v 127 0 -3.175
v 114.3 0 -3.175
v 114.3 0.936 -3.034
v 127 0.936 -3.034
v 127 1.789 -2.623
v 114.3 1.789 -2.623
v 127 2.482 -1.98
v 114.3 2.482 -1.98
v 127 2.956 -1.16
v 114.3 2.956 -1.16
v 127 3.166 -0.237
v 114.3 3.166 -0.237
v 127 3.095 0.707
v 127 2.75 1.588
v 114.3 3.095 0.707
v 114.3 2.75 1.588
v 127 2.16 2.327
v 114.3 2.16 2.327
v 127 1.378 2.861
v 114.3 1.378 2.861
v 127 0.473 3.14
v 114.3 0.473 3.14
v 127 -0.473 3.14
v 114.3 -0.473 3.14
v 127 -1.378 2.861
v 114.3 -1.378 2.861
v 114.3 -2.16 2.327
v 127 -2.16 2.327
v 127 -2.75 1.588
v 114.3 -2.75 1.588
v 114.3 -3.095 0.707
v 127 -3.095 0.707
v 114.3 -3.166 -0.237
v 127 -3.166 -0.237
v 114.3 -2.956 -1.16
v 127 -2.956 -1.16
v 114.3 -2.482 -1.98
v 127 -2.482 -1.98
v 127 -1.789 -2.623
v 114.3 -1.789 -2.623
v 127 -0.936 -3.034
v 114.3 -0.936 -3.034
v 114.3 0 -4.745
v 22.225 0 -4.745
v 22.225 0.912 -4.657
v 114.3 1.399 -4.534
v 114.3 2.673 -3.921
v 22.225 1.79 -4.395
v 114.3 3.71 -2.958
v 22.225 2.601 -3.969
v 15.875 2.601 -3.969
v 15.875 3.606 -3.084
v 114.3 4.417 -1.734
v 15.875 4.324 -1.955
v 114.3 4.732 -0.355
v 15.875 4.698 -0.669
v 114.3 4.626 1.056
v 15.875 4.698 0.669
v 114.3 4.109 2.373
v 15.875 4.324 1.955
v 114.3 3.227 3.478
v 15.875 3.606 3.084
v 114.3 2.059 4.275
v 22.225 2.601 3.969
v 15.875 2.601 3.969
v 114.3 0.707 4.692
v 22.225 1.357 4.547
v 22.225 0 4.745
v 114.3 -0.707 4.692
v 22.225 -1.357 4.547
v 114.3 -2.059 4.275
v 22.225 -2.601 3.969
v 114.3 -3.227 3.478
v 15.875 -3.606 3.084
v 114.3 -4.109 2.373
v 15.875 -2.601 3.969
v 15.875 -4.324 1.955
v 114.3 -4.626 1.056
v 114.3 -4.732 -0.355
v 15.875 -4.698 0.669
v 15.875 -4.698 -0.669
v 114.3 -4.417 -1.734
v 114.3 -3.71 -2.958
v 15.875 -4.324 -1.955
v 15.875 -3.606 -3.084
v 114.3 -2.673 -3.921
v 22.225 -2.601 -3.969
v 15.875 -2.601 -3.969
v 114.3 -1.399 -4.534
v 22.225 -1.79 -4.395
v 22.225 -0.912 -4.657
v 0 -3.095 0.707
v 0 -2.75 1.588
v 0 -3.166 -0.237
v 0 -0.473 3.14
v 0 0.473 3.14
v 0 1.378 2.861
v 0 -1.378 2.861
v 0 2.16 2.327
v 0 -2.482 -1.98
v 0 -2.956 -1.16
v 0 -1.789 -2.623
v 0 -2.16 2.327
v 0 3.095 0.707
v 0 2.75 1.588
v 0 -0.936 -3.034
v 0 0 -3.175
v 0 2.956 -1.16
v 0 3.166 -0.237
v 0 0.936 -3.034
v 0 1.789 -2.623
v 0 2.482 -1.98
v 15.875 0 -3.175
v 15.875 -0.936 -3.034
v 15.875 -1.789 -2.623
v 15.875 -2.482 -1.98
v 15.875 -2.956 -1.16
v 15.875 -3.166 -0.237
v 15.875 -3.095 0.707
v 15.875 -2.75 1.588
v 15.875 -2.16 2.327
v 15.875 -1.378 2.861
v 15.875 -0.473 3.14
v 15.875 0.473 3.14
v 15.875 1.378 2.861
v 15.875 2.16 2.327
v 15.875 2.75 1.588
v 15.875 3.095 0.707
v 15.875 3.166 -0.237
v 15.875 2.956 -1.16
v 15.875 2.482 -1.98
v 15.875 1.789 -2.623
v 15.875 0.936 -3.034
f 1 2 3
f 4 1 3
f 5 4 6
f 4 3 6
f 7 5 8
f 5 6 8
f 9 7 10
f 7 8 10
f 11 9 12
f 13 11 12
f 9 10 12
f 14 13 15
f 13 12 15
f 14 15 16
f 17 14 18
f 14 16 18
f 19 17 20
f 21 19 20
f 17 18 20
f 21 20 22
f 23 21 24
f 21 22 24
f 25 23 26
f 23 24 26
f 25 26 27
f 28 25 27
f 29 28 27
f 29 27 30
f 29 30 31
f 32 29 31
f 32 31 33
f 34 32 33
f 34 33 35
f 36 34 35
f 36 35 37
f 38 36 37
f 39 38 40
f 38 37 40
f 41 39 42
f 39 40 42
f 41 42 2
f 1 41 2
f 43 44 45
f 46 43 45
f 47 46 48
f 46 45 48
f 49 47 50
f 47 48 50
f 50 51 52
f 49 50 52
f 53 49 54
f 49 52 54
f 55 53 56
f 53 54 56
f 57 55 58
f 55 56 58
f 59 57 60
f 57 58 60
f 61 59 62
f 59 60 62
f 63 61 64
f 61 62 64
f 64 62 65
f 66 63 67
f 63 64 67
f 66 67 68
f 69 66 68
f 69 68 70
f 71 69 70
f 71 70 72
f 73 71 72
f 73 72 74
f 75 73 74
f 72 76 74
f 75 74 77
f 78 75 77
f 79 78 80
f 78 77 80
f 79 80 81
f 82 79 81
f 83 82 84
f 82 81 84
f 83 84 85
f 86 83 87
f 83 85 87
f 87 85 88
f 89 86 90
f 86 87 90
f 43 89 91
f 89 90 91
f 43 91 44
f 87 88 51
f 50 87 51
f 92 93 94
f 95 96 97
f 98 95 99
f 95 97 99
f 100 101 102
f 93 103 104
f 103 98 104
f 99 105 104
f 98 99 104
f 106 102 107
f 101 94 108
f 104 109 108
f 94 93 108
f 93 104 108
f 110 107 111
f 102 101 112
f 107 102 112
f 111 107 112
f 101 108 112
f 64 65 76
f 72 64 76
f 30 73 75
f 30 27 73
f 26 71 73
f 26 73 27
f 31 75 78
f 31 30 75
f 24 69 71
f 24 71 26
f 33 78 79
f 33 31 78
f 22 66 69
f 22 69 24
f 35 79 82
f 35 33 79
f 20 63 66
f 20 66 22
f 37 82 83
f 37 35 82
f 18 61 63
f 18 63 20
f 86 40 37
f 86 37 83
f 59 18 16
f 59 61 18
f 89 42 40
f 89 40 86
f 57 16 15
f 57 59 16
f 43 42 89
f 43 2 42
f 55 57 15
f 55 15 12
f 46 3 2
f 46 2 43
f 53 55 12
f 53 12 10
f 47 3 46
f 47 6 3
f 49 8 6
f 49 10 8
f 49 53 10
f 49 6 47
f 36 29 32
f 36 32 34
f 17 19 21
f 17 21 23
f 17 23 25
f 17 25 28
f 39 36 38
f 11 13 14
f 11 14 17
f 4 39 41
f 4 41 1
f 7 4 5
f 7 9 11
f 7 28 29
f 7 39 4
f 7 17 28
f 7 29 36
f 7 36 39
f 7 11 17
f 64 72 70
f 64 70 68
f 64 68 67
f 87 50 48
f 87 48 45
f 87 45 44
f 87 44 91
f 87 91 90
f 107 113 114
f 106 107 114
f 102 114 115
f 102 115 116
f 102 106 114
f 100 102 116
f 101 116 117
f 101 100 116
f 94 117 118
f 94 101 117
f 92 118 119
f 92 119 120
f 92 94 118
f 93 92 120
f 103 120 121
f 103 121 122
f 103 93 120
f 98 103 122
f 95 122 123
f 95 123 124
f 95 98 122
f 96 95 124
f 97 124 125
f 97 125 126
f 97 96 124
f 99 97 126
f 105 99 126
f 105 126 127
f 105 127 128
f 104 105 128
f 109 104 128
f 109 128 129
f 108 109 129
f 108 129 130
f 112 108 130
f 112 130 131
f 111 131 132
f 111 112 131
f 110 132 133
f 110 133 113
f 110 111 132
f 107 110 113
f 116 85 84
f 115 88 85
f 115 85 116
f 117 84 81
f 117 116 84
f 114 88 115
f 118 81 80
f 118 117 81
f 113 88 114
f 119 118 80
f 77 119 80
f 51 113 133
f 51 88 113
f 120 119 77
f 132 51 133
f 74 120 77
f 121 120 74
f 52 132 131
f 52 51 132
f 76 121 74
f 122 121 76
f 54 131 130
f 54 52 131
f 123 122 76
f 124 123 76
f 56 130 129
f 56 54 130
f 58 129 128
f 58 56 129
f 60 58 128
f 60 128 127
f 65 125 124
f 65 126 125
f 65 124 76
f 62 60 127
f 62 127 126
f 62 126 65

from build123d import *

# Parameters (mm, degrees)
SKETCH1_R           = 4.745
BASE_EXTRUDE_DEPTH  = 114.3
SKETCH2_R           = 3.175
BOSS_EXTRUDE1_DEPTH = 12.7
SKETCH3_R           = 4.745
SKETCH3_R_2         = 3.175
CUT_EXTRUDE1_DEPTH  = 15.875
CUT_EXTRUDE2_DEPTH  = 6.35


with BuildPart() as part:
    # Sketch1 → Base-Extrude (new body)
    with BuildSketch(Plane(origin=(0, 0, 0), x_dir=(0, 0, -1), z_dir=(1, 0, 0))):
        Circle(SKETCH1_R)
    extrude(amount=BASE_EXTRUDE_DEPTH)

    # Sketch2 → Boss-Extrude1 (add)
    with BuildSketch(Plane(origin=(114.3, 0, 0), x_dir=(0, 0, -1), z_dir=(1, 0, 0))):
        Circle(SKETCH2_R)
    extrude(amount=BOSS_EXTRUDE1_DEPTH)

    # Sketch3 → Cut-Extrude1 (cut)
    with BuildSketch(Plane.ZY):
        Circle(SKETCH3_R)
        with Locations(Location((0, 0, 0), (0, 0, 180))):
            Circle(SKETCH3_R_2, mode=Mode.SUBTRACT)
    extrude(amount=-CUT_EXTRUDE1_DEPTH, mode=Mode.SUBTRACT)

    # Sketch4 → Cut-Extrude2 (cut)
    with BuildSketch(Plane.ZY.offset(-15.875)):
        with BuildLine():
            Line((3.96875, 2.600778429), (3.96875, -2.600778429))
            ThreePointArc((3.96875, -2.600778429), (4.745, 0), (3.96875, 2.600778429))
        make_face()
        with BuildLine():
            Line((-3.96875, -2.600778429), (-3.96875, 2.600778429))
            ThreePointArc((-3.96875, 2.600778429), (-4.745, 0), (-3.96875, -2.600778429))
        make_face()
    extrude(amount=-CUT_EXTRUDE2_DEPTH, mode=Mode.SUBTRACT)


solid = part.part
